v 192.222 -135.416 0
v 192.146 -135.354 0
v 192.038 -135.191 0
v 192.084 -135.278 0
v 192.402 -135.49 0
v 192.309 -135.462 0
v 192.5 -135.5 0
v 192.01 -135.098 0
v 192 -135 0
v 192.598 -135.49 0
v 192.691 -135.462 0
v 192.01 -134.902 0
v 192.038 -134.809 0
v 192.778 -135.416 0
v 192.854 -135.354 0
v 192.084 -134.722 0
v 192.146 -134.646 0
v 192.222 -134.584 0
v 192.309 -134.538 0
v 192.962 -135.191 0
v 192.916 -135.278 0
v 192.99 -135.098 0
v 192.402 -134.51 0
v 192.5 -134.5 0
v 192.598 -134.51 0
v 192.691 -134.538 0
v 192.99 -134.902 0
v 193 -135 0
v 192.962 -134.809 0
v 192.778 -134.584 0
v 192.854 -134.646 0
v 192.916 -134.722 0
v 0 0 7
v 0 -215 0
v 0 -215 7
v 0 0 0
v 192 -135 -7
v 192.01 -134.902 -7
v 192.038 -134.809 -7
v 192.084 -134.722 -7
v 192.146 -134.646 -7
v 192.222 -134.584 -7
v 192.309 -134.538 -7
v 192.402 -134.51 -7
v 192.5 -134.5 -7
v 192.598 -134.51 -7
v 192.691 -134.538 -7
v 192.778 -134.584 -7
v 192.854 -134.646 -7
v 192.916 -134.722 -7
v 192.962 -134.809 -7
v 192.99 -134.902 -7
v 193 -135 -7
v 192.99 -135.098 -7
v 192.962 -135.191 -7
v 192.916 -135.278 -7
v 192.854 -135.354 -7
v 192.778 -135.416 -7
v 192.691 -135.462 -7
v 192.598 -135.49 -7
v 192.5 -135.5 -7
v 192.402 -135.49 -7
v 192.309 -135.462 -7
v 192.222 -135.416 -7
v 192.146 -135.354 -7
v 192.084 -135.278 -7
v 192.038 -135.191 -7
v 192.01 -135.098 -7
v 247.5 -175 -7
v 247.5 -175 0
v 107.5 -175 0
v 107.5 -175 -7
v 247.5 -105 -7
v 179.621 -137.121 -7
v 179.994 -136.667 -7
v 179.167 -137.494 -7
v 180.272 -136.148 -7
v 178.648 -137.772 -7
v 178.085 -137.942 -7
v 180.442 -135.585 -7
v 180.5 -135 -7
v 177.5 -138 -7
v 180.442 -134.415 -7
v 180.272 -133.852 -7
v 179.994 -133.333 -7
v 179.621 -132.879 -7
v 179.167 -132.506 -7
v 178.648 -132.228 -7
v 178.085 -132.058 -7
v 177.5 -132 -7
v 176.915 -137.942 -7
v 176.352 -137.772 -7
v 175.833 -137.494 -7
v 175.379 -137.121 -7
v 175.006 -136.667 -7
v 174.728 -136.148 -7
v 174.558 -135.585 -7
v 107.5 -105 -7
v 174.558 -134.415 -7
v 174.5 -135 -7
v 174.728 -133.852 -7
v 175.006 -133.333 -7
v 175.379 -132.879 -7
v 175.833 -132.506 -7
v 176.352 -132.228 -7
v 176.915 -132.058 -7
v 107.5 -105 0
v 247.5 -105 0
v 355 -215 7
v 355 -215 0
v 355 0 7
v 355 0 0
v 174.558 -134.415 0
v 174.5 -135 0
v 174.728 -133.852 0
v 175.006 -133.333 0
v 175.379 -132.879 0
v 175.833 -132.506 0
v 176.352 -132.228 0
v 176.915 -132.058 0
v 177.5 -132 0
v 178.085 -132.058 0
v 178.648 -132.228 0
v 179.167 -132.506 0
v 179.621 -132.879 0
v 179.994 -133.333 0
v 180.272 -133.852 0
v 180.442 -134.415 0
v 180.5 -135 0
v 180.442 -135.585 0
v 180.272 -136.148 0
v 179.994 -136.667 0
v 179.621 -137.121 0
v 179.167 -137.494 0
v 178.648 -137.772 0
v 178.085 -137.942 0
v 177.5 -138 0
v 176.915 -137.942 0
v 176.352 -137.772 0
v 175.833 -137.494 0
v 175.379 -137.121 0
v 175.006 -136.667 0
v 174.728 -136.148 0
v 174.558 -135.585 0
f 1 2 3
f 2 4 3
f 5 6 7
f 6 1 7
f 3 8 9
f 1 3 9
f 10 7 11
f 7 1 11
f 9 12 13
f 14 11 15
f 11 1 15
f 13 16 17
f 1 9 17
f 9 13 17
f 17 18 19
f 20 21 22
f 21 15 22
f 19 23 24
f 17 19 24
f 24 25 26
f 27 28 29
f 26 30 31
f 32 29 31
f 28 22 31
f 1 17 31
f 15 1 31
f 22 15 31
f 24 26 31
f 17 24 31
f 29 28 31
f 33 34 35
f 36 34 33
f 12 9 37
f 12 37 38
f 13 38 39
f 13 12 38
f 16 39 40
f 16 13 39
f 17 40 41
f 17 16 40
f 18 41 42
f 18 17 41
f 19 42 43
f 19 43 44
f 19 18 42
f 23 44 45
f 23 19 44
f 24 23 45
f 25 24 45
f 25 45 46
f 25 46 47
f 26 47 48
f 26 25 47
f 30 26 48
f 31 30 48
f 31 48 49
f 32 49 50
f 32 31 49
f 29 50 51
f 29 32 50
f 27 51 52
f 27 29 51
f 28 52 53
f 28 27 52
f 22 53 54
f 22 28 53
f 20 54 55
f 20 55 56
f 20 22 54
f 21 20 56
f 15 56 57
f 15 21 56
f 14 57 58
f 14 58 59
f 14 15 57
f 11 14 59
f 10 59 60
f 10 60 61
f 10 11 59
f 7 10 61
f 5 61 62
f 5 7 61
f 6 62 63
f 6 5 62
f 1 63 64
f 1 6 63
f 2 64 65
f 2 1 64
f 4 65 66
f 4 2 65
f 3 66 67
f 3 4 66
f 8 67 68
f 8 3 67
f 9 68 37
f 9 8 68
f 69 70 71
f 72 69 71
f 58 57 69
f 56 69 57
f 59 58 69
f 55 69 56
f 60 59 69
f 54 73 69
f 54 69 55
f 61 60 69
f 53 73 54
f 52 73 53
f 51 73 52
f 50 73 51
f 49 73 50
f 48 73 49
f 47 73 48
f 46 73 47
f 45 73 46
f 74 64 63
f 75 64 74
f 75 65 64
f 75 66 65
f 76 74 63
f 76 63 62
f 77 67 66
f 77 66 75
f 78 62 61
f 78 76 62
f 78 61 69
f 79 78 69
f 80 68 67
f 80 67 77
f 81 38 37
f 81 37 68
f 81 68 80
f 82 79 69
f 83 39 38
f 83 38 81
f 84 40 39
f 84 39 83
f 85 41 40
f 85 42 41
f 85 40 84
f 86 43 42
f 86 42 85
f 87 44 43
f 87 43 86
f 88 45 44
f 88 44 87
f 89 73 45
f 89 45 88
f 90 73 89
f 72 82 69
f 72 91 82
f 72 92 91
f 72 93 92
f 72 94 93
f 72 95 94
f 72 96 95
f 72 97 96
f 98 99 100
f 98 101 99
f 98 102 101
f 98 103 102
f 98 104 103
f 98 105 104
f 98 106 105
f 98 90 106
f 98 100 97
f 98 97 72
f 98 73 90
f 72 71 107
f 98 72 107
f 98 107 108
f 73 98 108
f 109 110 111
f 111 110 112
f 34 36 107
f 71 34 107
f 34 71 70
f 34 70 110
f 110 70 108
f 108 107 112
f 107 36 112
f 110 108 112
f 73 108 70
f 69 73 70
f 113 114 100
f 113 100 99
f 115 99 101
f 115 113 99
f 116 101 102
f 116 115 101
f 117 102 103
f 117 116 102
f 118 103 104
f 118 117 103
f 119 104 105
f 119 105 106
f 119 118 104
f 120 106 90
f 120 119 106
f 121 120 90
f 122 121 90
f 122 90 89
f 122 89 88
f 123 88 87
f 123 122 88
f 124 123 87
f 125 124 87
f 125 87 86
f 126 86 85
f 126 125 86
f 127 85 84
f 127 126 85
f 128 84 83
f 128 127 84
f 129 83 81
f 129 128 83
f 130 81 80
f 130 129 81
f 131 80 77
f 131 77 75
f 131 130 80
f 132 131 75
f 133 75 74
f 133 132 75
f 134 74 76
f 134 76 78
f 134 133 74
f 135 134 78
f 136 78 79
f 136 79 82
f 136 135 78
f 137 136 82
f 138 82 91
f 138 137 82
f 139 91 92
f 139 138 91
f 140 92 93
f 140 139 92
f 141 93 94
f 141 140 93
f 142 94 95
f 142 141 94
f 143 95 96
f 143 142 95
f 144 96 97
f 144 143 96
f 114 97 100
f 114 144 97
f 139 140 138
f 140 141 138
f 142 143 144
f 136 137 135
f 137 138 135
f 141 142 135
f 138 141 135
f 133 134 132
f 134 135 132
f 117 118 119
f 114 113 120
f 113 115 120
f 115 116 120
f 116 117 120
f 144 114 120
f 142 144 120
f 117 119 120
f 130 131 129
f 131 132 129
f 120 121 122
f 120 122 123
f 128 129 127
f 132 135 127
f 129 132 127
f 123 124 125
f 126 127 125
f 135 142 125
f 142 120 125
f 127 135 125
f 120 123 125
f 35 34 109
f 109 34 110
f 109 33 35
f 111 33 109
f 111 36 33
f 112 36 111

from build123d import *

# Parameters (mm, degrees)
SKETCH_1_W      = 355
SKETCH_1_H      = 215
EXTRUDE_1_DEPTH = 7
SKETCH_2_R      = 3
SKETCH_2_R_2    = 0.5
EXTRUDE_2_DEPTH = 7


with BuildPart() as part:
    # 草图1 → 凸台-拉伸1 (new body)
    with BuildSketch(Plane.XY):
        with Locations((177.5, -107.5)):
            Rectangle(SKETCH_1_W, SKETCH_1_H)
    extrude(amount=EXTRUDE_1_DEPTH)

    # 草图2 → 凸台-拉伸2 (add)
    with BuildSketch(Plane(origin=(0, 0, 0), x_dir=(-1, 0, 0), z_dir=(0, 0, -1))):
        Polygon((-177.5, -175), (-107.5, -175), (-107.5, -125), (-107.5, -105), (-247.5, -105), (-247.5, -175), align=None)
        with Locations((-177.5, -135)):
            Circle(SKETCH_2_R, mode=Mode.SUBTRACT)
        with Locations((-192.5, -135)):
            Circle(SKETCH_2_R_2, mode=Mode.SUBTRACT)
    extrude(amount=EXTRUDE_2_DEPTH)


solid = part.part
